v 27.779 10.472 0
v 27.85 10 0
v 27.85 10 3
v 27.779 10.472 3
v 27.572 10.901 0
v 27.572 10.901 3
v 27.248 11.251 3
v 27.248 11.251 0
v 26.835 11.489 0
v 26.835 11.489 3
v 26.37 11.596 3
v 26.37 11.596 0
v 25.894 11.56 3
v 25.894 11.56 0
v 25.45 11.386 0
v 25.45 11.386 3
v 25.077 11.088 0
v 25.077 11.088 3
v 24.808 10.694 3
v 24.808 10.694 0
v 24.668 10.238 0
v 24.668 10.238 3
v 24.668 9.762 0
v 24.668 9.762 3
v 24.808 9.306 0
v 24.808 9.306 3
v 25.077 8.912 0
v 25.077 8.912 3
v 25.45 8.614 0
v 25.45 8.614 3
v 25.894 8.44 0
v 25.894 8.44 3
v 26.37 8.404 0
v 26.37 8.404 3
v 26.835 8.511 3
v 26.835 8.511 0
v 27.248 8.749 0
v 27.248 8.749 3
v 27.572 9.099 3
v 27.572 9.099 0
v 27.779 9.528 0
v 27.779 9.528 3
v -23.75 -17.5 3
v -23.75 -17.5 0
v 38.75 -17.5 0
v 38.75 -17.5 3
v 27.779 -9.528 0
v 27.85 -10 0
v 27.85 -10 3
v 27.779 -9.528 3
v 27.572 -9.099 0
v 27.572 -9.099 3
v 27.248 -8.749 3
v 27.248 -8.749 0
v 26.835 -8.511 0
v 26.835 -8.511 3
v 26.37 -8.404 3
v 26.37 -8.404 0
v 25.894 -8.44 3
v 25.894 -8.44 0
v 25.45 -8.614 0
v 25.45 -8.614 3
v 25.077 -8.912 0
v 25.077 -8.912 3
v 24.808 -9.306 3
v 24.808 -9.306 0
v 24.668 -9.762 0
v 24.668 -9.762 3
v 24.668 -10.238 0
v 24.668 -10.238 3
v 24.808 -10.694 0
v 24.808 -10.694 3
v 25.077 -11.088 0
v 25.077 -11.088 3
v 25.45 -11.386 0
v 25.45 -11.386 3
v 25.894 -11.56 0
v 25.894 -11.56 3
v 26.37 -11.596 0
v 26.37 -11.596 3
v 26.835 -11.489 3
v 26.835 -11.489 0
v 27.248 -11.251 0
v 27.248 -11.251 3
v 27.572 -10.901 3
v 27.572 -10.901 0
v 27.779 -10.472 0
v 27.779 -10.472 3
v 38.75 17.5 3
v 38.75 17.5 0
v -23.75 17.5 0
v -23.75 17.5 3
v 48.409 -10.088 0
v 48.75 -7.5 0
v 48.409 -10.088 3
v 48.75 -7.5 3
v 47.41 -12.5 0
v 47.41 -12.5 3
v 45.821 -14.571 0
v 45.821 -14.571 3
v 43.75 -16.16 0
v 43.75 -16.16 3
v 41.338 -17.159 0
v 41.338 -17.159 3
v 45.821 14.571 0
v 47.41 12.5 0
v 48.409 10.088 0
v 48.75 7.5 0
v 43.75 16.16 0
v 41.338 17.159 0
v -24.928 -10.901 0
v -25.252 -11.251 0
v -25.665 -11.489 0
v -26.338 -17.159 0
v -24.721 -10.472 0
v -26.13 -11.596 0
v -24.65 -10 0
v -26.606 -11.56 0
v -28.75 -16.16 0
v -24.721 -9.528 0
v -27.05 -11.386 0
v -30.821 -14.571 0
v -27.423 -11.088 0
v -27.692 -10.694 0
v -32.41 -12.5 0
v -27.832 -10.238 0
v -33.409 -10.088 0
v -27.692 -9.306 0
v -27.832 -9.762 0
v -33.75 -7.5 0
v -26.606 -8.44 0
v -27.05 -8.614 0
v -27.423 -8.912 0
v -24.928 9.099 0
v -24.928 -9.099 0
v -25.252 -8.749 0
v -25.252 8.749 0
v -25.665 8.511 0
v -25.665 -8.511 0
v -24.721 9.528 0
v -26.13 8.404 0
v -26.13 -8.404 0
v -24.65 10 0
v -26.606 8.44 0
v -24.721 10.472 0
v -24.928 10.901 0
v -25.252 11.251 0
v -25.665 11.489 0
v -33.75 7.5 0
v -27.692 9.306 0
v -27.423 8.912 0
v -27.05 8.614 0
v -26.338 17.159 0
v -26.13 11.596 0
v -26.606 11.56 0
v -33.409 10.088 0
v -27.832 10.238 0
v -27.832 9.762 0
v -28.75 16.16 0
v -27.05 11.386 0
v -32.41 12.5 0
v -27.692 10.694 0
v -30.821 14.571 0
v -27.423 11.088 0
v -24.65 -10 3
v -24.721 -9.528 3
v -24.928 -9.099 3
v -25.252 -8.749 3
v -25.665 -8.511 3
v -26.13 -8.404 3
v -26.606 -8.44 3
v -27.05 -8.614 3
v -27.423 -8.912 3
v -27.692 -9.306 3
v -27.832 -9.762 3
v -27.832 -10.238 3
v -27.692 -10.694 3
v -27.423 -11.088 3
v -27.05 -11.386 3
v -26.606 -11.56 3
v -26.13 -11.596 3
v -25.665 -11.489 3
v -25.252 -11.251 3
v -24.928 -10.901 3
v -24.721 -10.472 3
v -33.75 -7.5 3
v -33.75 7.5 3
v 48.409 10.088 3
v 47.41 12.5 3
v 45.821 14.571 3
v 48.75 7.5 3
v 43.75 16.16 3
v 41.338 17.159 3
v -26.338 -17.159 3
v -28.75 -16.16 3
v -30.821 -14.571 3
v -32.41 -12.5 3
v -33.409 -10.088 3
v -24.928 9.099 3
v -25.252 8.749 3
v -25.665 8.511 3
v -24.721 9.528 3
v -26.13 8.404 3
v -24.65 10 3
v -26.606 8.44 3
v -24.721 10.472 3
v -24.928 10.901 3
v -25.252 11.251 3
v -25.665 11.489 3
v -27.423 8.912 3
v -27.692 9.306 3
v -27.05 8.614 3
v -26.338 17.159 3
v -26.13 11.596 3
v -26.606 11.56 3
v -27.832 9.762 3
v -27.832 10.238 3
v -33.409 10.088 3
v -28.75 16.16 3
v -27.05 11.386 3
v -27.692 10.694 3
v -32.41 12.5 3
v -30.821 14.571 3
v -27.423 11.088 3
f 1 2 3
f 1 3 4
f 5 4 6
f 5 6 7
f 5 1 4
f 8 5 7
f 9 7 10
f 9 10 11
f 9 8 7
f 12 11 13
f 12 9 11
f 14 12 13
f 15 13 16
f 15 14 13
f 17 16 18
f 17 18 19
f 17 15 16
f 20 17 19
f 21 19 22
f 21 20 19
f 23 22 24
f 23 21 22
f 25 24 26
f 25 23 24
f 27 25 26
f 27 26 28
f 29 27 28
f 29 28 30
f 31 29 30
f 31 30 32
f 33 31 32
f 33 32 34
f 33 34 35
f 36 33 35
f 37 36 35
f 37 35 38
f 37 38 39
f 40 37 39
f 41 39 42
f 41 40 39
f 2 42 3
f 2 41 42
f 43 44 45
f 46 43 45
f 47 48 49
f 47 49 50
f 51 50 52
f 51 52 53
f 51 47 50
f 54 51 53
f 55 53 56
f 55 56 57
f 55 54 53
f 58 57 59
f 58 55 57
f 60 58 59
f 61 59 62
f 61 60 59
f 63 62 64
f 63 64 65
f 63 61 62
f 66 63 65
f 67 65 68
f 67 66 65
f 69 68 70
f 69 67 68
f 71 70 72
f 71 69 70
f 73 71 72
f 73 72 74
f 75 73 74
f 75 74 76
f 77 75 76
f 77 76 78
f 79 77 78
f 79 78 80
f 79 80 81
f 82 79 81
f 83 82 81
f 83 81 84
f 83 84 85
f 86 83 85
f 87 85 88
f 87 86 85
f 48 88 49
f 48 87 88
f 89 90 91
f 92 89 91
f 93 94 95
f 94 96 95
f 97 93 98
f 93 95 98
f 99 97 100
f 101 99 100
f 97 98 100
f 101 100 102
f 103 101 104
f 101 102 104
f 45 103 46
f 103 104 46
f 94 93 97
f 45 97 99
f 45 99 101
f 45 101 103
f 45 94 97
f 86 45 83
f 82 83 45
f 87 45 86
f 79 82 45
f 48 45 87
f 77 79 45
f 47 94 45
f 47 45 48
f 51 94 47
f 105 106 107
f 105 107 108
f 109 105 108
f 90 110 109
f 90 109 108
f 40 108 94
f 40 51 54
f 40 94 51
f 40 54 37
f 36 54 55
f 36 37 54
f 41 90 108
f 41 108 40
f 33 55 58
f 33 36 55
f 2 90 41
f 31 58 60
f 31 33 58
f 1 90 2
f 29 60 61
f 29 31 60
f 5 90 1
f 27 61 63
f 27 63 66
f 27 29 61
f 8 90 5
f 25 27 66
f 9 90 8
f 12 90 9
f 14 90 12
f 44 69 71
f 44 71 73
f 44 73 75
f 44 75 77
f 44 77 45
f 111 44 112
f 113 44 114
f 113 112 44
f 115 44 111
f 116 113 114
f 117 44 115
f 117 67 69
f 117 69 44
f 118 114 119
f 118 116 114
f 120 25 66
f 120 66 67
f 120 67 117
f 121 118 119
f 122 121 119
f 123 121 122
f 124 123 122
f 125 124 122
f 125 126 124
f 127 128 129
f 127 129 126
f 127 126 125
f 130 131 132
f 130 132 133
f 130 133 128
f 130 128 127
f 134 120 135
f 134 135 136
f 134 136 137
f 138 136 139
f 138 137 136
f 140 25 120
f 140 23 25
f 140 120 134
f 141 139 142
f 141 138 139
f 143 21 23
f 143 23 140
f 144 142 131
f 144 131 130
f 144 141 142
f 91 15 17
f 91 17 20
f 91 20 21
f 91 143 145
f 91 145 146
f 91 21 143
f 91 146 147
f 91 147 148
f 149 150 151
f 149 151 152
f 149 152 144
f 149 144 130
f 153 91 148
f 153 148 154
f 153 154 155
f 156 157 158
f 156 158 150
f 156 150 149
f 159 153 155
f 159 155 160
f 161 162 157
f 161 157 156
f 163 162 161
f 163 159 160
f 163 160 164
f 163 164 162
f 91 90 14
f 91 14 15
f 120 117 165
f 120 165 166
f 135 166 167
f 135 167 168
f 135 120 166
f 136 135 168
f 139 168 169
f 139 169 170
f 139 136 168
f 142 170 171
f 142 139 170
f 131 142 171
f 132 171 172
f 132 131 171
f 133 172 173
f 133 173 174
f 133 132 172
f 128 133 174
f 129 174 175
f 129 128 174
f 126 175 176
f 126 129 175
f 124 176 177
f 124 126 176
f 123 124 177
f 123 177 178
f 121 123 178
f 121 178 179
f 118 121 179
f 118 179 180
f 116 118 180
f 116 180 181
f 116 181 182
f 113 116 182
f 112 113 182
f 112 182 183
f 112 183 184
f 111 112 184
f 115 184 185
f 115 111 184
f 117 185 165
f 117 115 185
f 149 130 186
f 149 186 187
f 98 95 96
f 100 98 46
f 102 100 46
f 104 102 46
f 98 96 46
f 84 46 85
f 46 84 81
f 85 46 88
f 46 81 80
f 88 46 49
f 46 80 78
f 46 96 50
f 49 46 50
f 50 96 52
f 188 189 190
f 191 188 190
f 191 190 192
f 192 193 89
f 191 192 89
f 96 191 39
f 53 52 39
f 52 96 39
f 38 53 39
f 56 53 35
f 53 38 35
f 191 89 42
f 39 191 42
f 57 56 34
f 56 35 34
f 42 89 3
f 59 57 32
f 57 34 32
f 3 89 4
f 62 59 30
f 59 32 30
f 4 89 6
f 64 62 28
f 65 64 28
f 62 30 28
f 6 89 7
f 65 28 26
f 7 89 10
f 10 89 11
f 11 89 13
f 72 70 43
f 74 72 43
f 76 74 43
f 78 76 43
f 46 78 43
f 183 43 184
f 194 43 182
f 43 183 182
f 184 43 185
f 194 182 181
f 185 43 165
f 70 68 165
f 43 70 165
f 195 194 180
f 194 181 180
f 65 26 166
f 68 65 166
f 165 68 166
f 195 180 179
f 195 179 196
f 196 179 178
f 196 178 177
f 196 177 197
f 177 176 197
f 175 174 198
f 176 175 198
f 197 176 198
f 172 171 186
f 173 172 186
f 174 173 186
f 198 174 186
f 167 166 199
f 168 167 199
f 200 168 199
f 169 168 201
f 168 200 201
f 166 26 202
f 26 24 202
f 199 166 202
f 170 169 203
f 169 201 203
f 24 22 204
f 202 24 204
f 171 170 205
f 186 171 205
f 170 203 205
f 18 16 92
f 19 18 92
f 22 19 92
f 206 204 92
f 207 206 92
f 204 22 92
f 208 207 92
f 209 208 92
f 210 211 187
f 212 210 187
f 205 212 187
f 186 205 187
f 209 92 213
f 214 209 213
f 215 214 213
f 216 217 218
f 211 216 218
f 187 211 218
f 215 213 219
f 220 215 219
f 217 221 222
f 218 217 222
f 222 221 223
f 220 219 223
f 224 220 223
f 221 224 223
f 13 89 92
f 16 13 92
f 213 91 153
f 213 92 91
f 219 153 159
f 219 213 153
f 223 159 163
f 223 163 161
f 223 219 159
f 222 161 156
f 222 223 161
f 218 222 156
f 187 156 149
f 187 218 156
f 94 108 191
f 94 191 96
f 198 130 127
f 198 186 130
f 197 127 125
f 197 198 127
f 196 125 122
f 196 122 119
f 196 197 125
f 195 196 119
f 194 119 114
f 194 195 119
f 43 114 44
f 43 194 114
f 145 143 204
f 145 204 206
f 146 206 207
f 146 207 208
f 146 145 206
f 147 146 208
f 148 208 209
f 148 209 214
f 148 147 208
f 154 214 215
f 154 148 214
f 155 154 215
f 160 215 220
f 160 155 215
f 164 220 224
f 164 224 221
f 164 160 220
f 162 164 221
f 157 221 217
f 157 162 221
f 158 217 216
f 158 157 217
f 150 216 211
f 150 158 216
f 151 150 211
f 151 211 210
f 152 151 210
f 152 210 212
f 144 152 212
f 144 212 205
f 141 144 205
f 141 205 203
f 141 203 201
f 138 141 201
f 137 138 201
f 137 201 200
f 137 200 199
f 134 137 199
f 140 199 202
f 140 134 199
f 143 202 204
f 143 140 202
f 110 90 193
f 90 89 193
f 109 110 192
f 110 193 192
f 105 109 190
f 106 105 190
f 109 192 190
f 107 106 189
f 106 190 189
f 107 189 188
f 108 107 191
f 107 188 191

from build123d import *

# Parameters (mm, degrees)
SKETCH_1_R      = 1.6
EXTRUDE_1_DEPTH = 3
FILLET_1_R      = 10


with BuildPart() as part:
    # 草图1 → 凸台-拉伸1 (new body)
    with BuildSketch(Plane.XY):
        Polygon((33.75, 17.5), (48.75, 17.5), (48.75, -17.5), (33.75, -17.5), (-33.75, -17.5), (-33.75, 17.5), align=None)
        with Locations((-26.25, 10)):
            Circle(SKETCH_1_R, mode=Mode.SUBTRACT)
        with Locations((-26.25, -10)):
            Circle(SKETCH_1_R, mode=Mode.SUBTRACT)
        with Locations((26.25, -10)):
            Circle(SKETCH_1_R, mode=Mode.SUBTRACT)
        with Locations((26.25, 10)):
            Circle(SKETCH_1_R, mode=Mode.SUBTRACT)
    extrude(amount=EXTRUDE_1_DEPTH)

    # 圆角1
    fillet_1_edges = [part.edges().sort_by_distance(p)[0] for p in [
        (48.75, 17.5, 1.5),
        (48.75, -17.5, 1.5),
        (-33.75, -17.5, 1.5),
        (-33.75, 17.5, 1.5),
    ]]
    fillet(fillet_1_edges, radius=FILLET_1_R)


solid = part.part
